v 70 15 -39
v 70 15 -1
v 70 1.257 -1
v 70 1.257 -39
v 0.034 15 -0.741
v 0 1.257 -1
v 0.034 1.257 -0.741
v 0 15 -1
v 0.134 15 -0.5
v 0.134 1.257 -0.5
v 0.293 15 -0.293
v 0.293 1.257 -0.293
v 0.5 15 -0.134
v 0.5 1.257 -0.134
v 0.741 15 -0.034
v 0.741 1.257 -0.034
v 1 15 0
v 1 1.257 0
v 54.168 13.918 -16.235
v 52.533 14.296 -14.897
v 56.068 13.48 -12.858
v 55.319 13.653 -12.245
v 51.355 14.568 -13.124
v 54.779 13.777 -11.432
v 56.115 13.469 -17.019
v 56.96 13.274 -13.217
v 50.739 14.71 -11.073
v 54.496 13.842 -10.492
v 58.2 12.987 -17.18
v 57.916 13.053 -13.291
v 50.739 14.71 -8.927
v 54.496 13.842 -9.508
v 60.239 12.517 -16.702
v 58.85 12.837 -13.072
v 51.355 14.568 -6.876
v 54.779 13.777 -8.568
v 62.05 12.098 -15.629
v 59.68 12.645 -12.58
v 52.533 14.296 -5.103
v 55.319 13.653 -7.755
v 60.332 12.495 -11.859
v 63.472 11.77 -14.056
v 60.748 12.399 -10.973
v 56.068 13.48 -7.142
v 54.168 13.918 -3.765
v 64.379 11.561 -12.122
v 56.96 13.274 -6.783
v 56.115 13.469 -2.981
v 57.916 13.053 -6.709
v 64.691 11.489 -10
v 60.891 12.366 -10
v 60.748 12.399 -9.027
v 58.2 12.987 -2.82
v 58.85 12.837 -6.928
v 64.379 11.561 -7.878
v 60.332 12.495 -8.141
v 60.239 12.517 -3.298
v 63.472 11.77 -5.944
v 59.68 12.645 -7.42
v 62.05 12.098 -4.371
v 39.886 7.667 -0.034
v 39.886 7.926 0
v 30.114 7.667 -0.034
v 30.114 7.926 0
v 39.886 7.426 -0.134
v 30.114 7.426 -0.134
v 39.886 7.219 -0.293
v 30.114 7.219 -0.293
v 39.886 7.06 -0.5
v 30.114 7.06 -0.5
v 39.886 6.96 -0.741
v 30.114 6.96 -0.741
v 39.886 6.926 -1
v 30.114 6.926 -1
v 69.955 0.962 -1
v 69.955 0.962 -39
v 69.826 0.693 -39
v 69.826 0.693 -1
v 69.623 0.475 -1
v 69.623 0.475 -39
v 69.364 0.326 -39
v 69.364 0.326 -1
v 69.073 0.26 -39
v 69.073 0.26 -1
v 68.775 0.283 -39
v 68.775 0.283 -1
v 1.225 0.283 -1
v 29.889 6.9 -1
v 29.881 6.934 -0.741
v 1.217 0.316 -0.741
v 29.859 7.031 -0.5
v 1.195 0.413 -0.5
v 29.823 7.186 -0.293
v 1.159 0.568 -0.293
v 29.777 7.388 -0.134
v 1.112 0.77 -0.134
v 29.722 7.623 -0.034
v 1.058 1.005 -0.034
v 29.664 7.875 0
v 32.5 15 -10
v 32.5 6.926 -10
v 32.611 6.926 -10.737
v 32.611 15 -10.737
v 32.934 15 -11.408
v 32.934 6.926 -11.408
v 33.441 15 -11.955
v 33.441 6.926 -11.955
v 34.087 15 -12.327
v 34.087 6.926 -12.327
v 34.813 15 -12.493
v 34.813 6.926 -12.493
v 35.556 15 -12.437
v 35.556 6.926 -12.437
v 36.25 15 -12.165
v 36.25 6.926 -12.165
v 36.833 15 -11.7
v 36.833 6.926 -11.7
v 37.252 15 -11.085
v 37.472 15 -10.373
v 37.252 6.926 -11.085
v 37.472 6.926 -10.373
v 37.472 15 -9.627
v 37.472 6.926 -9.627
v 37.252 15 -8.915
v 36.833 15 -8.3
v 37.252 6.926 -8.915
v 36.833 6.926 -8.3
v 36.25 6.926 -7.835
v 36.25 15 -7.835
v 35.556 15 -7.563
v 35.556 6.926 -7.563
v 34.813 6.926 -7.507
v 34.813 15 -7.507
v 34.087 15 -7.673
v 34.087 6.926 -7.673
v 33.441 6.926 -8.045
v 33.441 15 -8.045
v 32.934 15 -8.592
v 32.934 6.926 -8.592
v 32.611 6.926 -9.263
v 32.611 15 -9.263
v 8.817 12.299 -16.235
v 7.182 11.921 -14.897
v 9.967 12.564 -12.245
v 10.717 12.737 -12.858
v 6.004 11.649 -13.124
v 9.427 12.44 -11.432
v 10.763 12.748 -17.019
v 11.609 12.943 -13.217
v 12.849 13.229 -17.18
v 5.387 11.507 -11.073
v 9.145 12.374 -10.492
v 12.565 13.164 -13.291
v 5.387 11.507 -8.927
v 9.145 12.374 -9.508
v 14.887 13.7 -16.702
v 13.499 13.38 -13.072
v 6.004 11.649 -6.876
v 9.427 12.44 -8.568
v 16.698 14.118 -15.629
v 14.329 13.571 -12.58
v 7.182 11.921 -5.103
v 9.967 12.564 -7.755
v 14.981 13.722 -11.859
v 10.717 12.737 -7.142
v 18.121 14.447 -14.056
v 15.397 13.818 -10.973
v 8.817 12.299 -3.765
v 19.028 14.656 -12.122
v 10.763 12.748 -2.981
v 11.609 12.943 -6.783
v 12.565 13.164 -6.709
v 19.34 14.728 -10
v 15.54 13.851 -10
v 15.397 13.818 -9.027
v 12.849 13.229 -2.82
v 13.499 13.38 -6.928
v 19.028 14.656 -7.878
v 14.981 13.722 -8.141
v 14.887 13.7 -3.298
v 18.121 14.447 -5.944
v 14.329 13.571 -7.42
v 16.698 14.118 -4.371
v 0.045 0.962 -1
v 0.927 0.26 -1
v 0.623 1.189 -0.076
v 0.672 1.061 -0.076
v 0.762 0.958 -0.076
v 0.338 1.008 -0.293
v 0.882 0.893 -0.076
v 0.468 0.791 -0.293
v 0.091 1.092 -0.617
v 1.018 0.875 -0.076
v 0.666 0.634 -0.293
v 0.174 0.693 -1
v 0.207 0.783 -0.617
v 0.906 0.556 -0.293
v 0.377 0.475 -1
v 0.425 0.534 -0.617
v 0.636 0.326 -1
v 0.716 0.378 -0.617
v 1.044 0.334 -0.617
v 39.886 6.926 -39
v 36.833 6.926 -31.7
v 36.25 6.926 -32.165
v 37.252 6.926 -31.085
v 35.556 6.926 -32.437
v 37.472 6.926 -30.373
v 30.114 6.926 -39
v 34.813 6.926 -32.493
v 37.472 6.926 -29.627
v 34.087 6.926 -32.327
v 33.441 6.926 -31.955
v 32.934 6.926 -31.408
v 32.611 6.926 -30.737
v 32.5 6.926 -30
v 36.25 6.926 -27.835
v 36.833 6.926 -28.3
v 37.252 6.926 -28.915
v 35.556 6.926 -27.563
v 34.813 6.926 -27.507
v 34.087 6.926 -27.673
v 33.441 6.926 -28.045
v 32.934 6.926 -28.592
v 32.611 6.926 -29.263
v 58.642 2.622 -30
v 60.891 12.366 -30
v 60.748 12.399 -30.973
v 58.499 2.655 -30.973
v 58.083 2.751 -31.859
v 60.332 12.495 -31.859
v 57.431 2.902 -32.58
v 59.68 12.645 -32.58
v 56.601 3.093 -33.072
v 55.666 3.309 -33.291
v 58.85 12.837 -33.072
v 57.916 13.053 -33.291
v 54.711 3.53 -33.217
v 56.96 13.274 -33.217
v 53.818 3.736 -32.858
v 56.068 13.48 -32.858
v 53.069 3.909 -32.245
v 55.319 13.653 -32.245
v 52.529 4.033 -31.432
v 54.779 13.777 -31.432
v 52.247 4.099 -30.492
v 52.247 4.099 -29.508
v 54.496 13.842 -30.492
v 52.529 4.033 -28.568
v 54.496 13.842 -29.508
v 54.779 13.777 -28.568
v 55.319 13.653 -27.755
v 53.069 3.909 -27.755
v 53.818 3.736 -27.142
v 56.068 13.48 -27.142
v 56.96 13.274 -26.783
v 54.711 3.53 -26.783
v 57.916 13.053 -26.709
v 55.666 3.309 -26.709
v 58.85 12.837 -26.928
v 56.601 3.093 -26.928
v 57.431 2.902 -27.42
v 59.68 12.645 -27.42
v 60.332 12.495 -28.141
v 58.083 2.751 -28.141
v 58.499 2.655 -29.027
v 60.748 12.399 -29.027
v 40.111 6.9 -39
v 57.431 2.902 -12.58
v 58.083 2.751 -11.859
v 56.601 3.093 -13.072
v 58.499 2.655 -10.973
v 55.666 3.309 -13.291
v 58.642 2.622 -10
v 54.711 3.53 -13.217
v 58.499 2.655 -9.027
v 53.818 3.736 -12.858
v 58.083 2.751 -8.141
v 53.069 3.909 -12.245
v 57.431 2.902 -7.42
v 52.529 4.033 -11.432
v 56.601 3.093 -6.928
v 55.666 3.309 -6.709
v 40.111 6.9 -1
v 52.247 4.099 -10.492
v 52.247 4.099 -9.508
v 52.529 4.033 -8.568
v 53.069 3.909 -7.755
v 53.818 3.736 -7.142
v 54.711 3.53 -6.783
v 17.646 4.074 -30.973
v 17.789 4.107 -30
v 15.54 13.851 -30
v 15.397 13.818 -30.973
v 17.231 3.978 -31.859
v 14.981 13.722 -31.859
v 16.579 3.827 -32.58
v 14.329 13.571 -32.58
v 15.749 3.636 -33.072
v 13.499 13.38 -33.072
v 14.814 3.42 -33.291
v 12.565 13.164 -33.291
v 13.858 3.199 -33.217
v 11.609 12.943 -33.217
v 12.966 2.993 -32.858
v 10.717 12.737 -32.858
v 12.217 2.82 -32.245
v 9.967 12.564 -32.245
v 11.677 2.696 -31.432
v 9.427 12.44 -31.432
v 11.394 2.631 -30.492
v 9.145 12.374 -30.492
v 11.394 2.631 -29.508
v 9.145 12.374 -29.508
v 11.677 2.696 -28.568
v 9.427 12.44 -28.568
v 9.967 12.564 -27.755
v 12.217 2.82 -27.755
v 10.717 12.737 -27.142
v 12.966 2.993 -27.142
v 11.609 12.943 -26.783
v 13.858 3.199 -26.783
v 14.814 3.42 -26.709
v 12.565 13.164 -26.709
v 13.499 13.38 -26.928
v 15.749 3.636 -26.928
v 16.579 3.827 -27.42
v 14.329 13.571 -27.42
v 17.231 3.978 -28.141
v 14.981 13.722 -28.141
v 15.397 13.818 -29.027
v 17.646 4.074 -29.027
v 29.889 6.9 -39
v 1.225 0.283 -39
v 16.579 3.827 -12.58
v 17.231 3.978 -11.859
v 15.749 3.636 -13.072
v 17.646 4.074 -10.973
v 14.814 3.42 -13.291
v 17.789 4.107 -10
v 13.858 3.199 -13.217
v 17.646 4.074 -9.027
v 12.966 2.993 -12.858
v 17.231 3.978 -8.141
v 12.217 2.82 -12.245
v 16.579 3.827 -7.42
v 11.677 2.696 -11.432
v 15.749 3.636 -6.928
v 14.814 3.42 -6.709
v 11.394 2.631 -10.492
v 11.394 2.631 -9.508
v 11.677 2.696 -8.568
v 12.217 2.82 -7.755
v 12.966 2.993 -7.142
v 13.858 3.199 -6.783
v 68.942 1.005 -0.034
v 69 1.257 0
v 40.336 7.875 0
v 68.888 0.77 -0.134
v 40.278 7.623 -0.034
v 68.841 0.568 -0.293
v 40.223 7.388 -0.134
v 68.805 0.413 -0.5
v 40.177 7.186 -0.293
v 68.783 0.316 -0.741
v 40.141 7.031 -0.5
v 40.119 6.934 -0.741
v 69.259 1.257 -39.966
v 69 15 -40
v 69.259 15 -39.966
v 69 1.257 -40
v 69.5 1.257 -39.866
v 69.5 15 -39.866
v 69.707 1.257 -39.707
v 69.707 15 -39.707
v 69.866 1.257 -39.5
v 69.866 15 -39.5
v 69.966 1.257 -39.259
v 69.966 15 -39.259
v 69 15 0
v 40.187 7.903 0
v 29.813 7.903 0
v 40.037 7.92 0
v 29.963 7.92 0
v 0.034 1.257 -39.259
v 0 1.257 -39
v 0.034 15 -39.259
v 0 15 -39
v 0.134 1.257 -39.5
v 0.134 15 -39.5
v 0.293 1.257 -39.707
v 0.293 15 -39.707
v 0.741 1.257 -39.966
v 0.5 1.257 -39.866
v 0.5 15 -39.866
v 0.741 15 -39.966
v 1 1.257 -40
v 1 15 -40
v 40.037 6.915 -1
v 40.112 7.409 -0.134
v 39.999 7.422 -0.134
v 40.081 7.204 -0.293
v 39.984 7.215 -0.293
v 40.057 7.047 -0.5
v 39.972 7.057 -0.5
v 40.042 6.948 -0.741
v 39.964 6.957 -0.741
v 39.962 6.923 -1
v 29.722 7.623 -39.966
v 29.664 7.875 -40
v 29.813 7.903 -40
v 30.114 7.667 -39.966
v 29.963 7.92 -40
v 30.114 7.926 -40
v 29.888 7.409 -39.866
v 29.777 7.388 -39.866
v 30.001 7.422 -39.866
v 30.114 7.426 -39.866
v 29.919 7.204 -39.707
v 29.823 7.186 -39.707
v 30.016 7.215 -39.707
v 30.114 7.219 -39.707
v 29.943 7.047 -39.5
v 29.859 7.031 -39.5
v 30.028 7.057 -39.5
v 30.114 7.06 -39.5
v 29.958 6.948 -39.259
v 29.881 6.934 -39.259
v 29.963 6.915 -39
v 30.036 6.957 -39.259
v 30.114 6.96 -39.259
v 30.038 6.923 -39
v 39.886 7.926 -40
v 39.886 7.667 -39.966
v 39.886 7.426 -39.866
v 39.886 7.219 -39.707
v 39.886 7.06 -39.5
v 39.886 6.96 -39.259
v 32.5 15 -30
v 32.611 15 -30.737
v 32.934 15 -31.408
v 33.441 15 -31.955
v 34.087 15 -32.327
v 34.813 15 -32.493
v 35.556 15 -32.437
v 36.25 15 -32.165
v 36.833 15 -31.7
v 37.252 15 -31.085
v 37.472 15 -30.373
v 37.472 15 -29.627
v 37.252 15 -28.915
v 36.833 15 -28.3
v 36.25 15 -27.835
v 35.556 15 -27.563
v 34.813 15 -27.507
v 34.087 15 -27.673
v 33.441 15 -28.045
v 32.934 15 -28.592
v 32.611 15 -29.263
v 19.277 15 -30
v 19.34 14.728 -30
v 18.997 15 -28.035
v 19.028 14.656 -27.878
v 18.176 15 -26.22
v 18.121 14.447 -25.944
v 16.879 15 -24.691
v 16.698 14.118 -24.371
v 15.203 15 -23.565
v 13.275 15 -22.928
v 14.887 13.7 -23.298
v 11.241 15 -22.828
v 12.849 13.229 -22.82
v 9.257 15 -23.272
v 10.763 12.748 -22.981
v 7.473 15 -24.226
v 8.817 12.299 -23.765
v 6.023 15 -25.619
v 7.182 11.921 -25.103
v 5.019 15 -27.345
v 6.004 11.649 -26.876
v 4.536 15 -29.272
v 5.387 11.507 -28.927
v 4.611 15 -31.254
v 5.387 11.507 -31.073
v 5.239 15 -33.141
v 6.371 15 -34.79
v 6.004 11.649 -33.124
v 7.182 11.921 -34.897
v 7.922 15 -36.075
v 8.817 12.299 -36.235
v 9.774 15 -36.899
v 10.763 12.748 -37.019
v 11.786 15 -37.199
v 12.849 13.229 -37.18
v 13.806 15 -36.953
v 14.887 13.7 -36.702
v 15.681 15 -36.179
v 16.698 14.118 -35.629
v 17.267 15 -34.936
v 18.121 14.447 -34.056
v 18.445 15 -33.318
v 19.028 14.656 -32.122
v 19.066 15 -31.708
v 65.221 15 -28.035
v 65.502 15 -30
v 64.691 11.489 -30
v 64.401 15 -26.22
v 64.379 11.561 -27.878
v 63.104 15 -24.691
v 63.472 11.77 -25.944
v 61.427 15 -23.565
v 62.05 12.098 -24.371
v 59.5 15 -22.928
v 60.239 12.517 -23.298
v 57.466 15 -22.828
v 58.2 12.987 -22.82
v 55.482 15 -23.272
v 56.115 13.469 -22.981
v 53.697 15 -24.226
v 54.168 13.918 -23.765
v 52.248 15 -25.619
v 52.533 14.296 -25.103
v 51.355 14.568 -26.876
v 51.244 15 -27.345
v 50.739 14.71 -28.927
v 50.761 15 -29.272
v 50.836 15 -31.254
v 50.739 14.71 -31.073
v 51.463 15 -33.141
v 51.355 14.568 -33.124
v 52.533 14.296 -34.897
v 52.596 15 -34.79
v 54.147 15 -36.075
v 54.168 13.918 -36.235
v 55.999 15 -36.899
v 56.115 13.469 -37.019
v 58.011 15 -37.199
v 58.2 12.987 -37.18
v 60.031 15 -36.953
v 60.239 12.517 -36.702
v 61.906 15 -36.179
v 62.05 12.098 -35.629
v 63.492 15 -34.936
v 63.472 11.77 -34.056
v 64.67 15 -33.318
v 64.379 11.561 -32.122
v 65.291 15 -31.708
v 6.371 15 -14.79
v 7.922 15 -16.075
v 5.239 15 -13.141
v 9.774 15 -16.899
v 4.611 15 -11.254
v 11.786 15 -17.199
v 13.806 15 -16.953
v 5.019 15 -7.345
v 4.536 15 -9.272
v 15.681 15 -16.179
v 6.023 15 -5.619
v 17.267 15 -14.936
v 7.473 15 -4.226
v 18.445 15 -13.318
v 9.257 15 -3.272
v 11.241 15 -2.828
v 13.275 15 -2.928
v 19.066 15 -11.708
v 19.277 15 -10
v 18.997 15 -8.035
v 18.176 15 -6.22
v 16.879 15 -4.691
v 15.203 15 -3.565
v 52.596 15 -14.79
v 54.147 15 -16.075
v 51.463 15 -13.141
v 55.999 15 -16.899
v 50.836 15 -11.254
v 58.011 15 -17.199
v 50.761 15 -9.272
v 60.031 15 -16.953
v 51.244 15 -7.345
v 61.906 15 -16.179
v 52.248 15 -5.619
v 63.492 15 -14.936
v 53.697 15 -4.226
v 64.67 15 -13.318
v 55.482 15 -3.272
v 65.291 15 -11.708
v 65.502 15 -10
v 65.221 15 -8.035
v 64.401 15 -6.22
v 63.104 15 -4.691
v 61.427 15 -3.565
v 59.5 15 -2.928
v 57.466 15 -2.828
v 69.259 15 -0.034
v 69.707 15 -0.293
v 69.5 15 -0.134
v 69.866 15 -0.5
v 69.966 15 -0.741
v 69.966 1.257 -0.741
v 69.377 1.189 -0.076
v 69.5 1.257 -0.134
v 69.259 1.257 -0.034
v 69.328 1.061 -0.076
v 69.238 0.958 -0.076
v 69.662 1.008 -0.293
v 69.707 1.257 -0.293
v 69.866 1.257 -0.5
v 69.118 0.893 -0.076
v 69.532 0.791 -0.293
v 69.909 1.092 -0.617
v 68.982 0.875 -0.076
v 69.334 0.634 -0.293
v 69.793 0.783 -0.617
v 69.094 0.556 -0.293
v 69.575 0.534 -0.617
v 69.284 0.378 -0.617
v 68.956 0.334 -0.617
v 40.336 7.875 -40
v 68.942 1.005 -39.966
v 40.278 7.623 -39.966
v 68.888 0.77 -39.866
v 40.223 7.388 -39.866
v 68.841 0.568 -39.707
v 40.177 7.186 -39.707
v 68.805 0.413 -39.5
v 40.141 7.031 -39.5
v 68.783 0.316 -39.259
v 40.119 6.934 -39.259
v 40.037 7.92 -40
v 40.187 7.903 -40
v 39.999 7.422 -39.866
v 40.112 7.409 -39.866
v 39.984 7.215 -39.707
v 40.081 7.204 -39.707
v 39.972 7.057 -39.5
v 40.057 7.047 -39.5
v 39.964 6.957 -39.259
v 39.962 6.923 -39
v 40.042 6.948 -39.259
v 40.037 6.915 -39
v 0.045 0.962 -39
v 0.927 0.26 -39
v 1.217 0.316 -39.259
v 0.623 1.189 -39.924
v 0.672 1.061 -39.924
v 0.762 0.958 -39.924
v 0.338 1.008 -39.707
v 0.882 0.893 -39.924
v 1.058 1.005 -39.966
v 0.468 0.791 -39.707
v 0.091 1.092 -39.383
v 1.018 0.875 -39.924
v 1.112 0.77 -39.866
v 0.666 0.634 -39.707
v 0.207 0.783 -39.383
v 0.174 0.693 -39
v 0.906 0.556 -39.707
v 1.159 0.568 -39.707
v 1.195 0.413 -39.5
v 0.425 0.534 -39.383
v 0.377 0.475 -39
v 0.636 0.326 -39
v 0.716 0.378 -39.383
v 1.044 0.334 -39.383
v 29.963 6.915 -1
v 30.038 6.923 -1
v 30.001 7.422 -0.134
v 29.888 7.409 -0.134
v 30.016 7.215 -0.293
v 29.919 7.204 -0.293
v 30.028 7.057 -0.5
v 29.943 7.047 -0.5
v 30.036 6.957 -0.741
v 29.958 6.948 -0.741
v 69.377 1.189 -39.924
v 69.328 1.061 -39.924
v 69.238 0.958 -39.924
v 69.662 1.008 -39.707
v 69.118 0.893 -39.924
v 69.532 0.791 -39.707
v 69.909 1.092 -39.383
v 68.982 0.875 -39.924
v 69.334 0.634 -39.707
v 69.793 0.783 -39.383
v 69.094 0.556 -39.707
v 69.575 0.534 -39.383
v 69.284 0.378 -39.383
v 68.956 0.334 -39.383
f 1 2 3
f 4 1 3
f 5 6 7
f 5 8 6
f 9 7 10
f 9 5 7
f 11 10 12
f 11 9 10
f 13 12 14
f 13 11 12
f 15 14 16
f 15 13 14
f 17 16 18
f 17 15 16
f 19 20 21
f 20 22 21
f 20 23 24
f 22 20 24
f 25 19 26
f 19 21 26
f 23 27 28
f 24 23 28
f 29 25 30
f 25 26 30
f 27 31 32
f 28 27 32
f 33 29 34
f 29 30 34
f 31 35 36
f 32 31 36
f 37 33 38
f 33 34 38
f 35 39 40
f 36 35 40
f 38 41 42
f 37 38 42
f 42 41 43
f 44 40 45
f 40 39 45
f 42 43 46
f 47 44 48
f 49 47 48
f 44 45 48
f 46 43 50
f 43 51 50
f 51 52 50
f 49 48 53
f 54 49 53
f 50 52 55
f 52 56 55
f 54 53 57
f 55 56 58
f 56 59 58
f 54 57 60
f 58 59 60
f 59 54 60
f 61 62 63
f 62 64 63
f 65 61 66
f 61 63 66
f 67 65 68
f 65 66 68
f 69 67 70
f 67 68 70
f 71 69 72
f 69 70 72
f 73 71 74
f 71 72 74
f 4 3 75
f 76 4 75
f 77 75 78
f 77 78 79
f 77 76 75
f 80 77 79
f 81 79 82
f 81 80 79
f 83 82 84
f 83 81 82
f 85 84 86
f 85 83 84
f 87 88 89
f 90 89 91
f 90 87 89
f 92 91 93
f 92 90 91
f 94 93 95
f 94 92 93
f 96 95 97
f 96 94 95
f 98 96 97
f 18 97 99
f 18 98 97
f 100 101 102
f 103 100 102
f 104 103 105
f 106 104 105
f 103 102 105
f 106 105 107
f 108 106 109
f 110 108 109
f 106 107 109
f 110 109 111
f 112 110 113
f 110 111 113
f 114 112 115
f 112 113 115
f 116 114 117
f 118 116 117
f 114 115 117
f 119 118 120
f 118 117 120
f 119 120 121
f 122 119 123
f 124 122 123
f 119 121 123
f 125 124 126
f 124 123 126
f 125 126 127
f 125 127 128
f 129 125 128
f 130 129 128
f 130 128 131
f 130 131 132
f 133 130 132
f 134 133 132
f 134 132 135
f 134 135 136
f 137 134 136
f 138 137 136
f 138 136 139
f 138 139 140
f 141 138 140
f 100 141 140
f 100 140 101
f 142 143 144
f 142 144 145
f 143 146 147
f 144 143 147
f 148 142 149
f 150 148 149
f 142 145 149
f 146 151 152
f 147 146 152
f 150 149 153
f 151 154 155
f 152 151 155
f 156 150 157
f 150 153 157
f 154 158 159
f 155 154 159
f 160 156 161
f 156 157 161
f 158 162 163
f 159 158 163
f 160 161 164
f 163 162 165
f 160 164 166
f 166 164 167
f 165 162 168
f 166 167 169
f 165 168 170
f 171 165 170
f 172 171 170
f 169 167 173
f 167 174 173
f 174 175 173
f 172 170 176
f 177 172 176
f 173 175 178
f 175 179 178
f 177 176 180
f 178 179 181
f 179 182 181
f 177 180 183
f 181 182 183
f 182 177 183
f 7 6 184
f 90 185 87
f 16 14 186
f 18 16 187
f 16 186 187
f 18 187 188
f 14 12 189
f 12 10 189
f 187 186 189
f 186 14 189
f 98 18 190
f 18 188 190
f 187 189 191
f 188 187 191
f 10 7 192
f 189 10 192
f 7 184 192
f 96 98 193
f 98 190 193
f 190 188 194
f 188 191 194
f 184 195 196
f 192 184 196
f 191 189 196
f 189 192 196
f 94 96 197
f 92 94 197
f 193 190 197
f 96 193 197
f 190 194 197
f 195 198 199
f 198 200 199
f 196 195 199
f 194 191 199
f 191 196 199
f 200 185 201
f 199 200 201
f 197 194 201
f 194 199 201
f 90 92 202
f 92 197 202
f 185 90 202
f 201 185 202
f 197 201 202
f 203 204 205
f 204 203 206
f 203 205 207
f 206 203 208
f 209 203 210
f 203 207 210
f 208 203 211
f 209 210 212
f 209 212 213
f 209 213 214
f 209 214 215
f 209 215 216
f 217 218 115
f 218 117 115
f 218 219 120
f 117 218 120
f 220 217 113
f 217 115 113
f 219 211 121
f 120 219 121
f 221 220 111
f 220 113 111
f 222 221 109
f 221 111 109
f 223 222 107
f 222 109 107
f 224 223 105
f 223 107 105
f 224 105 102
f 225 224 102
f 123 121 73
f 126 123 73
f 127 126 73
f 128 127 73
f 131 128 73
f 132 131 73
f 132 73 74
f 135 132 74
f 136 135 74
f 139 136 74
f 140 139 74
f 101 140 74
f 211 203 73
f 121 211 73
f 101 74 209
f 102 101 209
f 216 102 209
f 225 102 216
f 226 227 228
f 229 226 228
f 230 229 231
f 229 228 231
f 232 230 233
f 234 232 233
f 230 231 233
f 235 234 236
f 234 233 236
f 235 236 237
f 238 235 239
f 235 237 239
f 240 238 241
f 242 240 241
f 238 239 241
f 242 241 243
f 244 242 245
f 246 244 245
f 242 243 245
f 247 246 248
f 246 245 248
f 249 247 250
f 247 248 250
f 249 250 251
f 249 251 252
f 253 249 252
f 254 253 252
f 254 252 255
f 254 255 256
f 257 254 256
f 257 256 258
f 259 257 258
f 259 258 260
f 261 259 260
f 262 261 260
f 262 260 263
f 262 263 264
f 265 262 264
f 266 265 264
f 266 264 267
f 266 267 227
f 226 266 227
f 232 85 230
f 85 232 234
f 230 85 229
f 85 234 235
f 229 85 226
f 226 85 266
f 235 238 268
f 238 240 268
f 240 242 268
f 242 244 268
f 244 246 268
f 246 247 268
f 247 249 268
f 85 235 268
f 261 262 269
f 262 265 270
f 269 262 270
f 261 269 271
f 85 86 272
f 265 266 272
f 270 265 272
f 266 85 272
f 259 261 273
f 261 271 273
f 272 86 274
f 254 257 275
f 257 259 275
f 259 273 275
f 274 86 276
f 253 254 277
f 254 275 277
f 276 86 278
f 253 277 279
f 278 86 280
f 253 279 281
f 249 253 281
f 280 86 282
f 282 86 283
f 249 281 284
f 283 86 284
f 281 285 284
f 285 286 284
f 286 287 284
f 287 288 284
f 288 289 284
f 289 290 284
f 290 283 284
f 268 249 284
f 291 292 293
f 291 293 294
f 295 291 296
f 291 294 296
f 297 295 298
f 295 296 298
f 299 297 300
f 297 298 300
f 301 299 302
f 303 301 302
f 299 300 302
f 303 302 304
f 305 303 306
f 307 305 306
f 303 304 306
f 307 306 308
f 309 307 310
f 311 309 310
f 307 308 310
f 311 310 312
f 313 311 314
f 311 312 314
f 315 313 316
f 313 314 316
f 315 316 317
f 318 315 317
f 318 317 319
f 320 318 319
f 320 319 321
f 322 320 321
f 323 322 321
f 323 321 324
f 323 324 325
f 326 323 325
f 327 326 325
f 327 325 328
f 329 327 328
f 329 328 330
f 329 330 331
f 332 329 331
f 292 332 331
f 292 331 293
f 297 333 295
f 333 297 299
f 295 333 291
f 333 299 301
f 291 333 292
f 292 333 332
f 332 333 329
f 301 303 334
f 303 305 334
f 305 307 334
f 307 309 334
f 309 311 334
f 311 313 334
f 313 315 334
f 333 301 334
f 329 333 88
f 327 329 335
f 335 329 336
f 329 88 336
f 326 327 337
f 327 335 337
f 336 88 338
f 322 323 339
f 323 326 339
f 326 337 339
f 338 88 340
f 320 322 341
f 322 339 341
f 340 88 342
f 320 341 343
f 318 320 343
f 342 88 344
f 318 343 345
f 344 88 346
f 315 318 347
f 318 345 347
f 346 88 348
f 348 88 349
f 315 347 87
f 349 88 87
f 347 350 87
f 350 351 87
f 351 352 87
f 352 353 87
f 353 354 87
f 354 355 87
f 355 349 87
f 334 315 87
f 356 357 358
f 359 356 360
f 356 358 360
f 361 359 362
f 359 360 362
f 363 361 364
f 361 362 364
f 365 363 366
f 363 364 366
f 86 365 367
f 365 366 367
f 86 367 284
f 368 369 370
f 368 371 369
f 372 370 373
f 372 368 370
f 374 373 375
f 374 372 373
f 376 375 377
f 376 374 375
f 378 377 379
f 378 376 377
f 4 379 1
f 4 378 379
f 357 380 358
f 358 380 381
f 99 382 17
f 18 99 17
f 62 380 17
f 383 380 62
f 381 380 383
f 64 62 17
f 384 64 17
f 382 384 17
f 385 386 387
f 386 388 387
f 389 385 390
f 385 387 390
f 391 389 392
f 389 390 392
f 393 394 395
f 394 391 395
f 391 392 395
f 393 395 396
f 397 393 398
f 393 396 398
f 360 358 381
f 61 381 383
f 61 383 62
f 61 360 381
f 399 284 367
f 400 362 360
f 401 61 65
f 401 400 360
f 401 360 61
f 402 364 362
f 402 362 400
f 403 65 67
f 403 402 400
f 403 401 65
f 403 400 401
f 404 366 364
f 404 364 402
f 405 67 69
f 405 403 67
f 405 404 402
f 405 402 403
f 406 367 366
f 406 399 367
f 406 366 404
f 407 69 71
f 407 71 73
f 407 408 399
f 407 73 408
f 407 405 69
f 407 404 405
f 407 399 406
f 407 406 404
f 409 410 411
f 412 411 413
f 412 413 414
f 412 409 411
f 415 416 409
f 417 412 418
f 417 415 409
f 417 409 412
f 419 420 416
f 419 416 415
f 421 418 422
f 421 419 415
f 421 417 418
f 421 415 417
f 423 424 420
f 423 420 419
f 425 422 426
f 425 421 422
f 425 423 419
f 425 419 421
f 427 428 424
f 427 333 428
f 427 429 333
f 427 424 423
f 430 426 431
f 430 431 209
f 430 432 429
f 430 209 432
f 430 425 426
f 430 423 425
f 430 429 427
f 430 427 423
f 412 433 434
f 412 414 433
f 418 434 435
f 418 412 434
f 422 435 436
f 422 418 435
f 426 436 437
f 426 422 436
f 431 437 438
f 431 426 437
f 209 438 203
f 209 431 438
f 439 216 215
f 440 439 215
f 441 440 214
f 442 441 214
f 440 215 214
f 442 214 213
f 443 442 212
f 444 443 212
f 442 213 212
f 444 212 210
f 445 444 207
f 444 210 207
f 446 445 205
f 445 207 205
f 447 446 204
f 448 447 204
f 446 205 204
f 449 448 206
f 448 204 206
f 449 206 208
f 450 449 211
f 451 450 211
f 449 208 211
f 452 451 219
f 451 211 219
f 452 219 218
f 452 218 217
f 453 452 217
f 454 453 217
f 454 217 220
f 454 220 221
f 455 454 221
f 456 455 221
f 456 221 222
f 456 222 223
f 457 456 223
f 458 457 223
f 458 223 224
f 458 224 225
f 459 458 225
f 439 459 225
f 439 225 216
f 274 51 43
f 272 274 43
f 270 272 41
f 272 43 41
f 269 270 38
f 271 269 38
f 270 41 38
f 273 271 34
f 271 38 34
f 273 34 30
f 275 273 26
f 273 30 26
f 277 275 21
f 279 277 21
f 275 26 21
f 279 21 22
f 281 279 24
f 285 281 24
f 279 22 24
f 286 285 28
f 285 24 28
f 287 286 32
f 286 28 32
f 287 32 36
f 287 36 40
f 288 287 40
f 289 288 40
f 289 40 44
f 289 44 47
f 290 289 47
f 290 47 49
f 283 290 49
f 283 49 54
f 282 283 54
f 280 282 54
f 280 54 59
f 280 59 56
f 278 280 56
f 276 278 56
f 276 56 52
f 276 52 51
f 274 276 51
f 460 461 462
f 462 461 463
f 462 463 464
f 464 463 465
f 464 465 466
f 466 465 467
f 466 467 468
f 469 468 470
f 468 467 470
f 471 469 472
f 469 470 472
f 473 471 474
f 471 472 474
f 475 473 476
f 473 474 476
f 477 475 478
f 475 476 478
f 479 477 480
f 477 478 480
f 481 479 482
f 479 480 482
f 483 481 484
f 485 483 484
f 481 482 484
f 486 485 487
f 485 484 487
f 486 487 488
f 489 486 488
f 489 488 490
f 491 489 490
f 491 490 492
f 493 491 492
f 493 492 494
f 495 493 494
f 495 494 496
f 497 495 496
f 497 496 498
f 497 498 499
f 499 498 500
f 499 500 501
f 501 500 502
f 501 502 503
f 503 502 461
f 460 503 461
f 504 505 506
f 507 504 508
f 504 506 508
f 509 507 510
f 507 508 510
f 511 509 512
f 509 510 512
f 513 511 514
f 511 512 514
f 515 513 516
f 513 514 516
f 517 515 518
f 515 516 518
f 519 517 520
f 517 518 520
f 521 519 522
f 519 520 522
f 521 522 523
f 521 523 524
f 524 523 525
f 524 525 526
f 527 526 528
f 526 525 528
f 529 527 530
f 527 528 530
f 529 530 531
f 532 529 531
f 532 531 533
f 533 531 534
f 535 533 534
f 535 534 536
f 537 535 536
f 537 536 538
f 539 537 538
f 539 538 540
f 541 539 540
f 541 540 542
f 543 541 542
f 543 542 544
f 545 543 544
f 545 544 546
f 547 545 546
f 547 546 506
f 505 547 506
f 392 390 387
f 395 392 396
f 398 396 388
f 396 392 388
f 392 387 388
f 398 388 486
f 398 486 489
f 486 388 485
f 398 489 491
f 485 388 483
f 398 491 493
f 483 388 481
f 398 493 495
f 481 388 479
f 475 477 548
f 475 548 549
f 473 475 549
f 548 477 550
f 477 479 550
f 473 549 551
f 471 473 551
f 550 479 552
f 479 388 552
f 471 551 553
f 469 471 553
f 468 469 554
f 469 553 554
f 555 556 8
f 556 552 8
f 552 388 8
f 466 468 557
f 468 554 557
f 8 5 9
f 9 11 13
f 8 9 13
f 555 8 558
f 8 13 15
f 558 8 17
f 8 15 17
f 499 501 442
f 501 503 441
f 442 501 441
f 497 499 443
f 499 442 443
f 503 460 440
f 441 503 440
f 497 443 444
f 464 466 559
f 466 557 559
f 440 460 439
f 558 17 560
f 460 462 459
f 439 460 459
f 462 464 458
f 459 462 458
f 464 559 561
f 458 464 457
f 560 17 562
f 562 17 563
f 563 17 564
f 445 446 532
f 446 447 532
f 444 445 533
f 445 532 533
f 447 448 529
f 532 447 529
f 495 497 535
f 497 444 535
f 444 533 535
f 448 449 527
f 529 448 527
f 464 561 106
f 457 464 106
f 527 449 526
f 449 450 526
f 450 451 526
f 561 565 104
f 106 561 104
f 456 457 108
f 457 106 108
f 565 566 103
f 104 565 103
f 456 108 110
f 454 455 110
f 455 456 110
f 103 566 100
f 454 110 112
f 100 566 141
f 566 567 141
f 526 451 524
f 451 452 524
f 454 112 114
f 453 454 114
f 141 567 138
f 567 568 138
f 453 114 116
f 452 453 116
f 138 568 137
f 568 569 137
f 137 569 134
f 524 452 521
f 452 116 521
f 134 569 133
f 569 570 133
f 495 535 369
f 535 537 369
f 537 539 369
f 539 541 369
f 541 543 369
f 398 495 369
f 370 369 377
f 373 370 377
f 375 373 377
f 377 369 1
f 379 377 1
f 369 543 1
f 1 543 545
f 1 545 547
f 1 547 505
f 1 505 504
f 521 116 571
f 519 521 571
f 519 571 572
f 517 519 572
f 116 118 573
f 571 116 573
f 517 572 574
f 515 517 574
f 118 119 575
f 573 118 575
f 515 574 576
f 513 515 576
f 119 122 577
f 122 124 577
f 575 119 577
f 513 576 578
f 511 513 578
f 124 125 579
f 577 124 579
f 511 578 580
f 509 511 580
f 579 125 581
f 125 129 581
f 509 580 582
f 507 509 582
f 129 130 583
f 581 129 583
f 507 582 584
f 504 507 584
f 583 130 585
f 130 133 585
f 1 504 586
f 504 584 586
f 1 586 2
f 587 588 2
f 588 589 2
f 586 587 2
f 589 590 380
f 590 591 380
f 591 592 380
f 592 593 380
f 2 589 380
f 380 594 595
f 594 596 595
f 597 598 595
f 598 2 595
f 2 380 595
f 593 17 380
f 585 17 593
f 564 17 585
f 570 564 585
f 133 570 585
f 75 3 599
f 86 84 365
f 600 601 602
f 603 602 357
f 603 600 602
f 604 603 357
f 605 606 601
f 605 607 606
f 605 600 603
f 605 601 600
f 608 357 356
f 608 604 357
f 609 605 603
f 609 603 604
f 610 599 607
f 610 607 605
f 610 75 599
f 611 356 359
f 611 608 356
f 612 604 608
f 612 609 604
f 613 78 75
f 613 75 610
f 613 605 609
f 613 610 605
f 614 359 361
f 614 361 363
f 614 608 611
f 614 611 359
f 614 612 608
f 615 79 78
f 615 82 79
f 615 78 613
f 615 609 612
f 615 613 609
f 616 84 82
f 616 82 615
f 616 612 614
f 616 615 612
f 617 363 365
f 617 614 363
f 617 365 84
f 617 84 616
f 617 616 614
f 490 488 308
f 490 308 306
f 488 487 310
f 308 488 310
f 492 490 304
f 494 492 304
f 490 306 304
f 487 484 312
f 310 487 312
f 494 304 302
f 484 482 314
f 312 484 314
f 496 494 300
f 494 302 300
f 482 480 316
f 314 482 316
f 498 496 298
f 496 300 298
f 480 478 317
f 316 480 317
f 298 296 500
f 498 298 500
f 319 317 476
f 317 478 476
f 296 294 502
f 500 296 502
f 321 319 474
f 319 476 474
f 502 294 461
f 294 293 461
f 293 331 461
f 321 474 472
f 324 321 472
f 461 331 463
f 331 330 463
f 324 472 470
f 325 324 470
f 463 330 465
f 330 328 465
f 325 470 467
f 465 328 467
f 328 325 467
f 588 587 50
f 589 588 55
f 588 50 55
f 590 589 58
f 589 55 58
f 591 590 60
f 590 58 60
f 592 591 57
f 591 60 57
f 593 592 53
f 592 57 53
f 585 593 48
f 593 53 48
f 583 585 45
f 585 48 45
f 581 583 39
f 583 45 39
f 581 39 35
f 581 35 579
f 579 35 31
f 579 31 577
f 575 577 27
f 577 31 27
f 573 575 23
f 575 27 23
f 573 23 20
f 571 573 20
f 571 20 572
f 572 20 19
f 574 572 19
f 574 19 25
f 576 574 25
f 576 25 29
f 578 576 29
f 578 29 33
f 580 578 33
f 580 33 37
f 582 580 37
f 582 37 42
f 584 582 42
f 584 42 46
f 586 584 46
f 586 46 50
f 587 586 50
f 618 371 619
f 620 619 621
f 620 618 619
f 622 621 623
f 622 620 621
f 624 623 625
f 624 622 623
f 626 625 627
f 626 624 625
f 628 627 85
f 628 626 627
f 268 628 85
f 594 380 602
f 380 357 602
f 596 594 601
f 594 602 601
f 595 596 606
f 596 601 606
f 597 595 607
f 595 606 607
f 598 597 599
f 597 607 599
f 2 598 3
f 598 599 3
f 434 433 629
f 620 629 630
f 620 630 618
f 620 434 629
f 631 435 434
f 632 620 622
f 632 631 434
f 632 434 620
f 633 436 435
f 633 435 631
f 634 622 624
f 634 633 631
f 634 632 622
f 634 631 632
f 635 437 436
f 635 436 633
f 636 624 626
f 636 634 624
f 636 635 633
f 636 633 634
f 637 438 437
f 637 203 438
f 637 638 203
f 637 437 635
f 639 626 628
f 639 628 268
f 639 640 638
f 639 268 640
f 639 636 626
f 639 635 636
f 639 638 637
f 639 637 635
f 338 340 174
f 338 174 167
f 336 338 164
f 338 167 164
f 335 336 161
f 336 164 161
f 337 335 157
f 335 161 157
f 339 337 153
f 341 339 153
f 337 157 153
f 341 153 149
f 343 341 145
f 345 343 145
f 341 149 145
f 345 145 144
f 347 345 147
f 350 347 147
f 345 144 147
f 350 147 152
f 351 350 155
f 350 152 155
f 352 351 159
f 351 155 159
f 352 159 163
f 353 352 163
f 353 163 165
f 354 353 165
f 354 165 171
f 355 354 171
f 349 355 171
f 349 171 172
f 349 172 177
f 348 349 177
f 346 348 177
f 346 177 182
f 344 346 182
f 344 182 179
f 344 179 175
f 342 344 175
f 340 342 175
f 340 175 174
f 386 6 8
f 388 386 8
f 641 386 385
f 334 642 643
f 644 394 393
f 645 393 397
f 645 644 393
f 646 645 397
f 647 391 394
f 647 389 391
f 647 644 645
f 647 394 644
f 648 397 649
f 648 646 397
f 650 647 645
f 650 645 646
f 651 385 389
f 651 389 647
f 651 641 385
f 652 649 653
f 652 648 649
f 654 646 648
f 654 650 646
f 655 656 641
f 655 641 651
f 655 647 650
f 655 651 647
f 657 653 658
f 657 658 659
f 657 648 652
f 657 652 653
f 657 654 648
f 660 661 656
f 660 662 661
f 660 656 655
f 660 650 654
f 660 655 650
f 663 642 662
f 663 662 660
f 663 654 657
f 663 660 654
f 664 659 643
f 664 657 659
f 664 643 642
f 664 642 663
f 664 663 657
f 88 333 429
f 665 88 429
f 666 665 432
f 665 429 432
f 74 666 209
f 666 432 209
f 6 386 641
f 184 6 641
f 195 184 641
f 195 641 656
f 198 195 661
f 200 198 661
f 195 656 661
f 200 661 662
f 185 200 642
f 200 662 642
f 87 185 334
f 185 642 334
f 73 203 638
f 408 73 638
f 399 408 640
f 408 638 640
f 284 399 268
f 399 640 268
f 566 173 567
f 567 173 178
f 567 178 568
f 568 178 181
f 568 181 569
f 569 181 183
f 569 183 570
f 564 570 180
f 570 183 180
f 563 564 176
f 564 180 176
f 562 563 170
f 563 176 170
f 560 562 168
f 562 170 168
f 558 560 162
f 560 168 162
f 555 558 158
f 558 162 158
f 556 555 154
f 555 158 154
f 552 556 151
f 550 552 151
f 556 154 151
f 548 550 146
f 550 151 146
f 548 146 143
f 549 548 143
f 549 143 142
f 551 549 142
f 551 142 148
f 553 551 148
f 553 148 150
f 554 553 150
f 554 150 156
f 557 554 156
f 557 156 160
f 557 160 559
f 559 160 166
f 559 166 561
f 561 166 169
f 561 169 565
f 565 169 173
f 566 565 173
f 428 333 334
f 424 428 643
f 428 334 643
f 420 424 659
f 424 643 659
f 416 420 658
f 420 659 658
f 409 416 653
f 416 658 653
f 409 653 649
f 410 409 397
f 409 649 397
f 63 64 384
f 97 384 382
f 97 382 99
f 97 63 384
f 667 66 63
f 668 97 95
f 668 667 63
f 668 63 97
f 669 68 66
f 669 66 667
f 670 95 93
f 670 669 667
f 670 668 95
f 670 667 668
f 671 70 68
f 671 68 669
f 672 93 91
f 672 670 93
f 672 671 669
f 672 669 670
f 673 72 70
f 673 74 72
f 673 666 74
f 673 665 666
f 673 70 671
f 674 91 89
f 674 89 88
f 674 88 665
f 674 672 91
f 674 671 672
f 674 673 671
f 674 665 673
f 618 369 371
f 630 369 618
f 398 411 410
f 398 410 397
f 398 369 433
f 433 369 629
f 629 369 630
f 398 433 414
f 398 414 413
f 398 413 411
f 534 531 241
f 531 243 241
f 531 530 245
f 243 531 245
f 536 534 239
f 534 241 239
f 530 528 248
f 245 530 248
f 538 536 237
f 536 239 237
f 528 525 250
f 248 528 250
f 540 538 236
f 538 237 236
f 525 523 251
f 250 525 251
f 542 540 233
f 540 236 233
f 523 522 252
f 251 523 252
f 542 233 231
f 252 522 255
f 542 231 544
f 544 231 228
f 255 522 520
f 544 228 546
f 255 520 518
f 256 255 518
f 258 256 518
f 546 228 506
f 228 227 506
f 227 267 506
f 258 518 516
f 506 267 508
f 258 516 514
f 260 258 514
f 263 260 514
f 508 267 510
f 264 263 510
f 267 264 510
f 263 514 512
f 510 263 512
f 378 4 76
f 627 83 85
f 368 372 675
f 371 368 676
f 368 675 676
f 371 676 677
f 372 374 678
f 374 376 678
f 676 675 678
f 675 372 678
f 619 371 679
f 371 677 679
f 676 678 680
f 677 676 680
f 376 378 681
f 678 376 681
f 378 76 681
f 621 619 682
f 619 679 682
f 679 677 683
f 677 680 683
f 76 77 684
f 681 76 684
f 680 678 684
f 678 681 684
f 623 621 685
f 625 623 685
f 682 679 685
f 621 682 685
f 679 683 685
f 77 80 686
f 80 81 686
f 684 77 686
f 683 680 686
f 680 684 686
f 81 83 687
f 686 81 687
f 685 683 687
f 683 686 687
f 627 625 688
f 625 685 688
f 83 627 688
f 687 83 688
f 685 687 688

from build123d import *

# Parameters (mm, degrees)
BOSS_EXTRUDE1_DEPTH          = 40
F_5_0_5_DIAMETER_HOLE1_D     = 5
F_5_0_5_DIAMETER_HOLE1_DEPTH = 19
F_5_0_5_DIAMETER_HOLE1_TIP   = 1.502151548
FILLET1_R                    = 1
M6_CLEARANCE_HOLE3_D         = 6.6
M6_CLEARANCE_HOLE4_D         = 6.6
M6_CLEARANCE_HOLE4_DEPTH     = 19
M6_CLEARANCE_HOLE4_TIP       = 1.982840043
CUT_EXTRUDE2_START           = -10
SKETCH16_R                   = 7.2
CUT_EXTRUDE2_DEPTH           = 5.615550972
CUT_EXTRUDE3_START           = -10
SKETCH17_R                   = 7.2
CUT_EXTRUDE3_DEPTH           = 5.615550972


with BuildPart() as part:
    # Sketch1 → Boss-Extrude1 (new body)
    with BuildSketch(Plane.XY):
        Polygon((0, 0), (0, 15), (70, 15), (70, 0), (40, 6.926045734), (30, 6.926045734), align=None)
    extrude(amount=-BOSS_EXTRUDE1_DEPTH)

    # Ø5.0 (5) Diameter Hole1
    with Locations(Plane(origin=(0, 15, 0), x_dir=(1, 0, 0), z_dir=(0, 1, 0))):
        with Locations((35, 10), (35, 30)):
            Hole(F_5_0_5_DIAMETER_HOLE1_D / 2, depth=F_5_0_5_DIAMETER_HOLE1_DEPTH)
            with Locations((0, 0, -(F_5_0_5_DIAMETER_HOLE1_DEPTH + F_5_0_5_DIAMETER_HOLE1_TIP / 2))):  # 118° drill point
                Cone(0, F_5_0_5_DIAMETER_HOLE1_D / 2, F_5_0_5_DIAMETER_HOLE1_TIP, mode=Mode.SUBTRACT)

    # Fillet1
    fillet1_edges = [part.edges().sort_by_distance(p)[0] for p in [
        (55, 3.463022867, -40),
        (0, 0, -20),
        (70, 0, -20),
        (40, 6.926045734, -20),
        (30, 6.926045734, -20),
        (70, 7.5, -40),
        (0, 7.5, -40),
        (15, 3.463022867, -40),
        (0, 7.5, 0),
        (70, 7.5, 0),
        (35, 6.926045734, -40),
        (55, 3.463022867, 0),
        (35, 6.926045734, 0),
        (15, 3.463022867, 0),
    ]]
    fillet(fillet1_edges, radius=FILLET1_R)

    # M6 Clearance Hole3 (through all)
    with Locations(Plane(origin=(0, 0, 0), x_dir=(-0.974370065, -0.224951054, 0), z_dir=(0.224951054, -0.974370065, 0))):
        with Locations((-14.957172299, 10), (-14.957172299, 30)):
            Hole(M6_CLEARANCE_HOLE3_D / 2)

    # M6 Clearance Hole4
    with Locations(Plane(origin=(3.54220838, 15.342990138, 0), x_dir=(-0.974370065, 0.224951054, 0), z_dir=(-0.224951054, -0.974370065, 0))):
        with Locations((-53.248732236, 10), (-53.248732236, 30)):
            Hole(M6_CLEARANCE_HOLE4_D / 2, depth=M6_CLEARANCE_HOLE4_DEPTH)
            with Locations((0, 0, -(M6_CLEARANCE_HOLE4_DEPTH + M6_CLEARANCE_HOLE4_TIP / 2))):  # 118° drill point
                Cone(0, M6_CLEARANCE_HOLE4_D / 2, M6_CLEARANCE_HOLE4_TIP, mode=Mode.SUBTRACT)

    # Sketch16 → Cut-Extrude2 (cut, through all)
    with BuildSketch(Plane(origin=(0, 0, 0), x_dir=(0.974370065, 0.224951054, 0), z_dir=(0.224951054, -0.974370065, 0)).offset(CUT_EXTRUDE2_START)):
        with Locations((14.957172299, -10)):
            Circle(SKETCH16_R)
        with Locations((14.957172299, -30)):
            Circle(SKETCH16_R)
    extrude(amount=-CUT_EXTRUDE2_DEPTH, mode=Mode.SUBTRACT)

    # Sketch17 → Cut-Extrude3 (cut, through all)
    with BuildSketch(Plane(origin=(3.54220838, 15.342990138, 0), x_dir=(0.974370065, -0.224951054, 0), z_dir=(-0.224951054, -0.974370065, 0)).offset(CUT_EXTRUDE3_START)):
        with Locations((53.248732236, -10)):
            Circle(SKETCH17_R)
        with Locations((53.248732236, -30)):
            Circle(SKETCH17_R)
    extrude(amount=-CUT_EXTRUDE3_DEPTH, mode=Mode.SUBTRACT)


solid = part.part
